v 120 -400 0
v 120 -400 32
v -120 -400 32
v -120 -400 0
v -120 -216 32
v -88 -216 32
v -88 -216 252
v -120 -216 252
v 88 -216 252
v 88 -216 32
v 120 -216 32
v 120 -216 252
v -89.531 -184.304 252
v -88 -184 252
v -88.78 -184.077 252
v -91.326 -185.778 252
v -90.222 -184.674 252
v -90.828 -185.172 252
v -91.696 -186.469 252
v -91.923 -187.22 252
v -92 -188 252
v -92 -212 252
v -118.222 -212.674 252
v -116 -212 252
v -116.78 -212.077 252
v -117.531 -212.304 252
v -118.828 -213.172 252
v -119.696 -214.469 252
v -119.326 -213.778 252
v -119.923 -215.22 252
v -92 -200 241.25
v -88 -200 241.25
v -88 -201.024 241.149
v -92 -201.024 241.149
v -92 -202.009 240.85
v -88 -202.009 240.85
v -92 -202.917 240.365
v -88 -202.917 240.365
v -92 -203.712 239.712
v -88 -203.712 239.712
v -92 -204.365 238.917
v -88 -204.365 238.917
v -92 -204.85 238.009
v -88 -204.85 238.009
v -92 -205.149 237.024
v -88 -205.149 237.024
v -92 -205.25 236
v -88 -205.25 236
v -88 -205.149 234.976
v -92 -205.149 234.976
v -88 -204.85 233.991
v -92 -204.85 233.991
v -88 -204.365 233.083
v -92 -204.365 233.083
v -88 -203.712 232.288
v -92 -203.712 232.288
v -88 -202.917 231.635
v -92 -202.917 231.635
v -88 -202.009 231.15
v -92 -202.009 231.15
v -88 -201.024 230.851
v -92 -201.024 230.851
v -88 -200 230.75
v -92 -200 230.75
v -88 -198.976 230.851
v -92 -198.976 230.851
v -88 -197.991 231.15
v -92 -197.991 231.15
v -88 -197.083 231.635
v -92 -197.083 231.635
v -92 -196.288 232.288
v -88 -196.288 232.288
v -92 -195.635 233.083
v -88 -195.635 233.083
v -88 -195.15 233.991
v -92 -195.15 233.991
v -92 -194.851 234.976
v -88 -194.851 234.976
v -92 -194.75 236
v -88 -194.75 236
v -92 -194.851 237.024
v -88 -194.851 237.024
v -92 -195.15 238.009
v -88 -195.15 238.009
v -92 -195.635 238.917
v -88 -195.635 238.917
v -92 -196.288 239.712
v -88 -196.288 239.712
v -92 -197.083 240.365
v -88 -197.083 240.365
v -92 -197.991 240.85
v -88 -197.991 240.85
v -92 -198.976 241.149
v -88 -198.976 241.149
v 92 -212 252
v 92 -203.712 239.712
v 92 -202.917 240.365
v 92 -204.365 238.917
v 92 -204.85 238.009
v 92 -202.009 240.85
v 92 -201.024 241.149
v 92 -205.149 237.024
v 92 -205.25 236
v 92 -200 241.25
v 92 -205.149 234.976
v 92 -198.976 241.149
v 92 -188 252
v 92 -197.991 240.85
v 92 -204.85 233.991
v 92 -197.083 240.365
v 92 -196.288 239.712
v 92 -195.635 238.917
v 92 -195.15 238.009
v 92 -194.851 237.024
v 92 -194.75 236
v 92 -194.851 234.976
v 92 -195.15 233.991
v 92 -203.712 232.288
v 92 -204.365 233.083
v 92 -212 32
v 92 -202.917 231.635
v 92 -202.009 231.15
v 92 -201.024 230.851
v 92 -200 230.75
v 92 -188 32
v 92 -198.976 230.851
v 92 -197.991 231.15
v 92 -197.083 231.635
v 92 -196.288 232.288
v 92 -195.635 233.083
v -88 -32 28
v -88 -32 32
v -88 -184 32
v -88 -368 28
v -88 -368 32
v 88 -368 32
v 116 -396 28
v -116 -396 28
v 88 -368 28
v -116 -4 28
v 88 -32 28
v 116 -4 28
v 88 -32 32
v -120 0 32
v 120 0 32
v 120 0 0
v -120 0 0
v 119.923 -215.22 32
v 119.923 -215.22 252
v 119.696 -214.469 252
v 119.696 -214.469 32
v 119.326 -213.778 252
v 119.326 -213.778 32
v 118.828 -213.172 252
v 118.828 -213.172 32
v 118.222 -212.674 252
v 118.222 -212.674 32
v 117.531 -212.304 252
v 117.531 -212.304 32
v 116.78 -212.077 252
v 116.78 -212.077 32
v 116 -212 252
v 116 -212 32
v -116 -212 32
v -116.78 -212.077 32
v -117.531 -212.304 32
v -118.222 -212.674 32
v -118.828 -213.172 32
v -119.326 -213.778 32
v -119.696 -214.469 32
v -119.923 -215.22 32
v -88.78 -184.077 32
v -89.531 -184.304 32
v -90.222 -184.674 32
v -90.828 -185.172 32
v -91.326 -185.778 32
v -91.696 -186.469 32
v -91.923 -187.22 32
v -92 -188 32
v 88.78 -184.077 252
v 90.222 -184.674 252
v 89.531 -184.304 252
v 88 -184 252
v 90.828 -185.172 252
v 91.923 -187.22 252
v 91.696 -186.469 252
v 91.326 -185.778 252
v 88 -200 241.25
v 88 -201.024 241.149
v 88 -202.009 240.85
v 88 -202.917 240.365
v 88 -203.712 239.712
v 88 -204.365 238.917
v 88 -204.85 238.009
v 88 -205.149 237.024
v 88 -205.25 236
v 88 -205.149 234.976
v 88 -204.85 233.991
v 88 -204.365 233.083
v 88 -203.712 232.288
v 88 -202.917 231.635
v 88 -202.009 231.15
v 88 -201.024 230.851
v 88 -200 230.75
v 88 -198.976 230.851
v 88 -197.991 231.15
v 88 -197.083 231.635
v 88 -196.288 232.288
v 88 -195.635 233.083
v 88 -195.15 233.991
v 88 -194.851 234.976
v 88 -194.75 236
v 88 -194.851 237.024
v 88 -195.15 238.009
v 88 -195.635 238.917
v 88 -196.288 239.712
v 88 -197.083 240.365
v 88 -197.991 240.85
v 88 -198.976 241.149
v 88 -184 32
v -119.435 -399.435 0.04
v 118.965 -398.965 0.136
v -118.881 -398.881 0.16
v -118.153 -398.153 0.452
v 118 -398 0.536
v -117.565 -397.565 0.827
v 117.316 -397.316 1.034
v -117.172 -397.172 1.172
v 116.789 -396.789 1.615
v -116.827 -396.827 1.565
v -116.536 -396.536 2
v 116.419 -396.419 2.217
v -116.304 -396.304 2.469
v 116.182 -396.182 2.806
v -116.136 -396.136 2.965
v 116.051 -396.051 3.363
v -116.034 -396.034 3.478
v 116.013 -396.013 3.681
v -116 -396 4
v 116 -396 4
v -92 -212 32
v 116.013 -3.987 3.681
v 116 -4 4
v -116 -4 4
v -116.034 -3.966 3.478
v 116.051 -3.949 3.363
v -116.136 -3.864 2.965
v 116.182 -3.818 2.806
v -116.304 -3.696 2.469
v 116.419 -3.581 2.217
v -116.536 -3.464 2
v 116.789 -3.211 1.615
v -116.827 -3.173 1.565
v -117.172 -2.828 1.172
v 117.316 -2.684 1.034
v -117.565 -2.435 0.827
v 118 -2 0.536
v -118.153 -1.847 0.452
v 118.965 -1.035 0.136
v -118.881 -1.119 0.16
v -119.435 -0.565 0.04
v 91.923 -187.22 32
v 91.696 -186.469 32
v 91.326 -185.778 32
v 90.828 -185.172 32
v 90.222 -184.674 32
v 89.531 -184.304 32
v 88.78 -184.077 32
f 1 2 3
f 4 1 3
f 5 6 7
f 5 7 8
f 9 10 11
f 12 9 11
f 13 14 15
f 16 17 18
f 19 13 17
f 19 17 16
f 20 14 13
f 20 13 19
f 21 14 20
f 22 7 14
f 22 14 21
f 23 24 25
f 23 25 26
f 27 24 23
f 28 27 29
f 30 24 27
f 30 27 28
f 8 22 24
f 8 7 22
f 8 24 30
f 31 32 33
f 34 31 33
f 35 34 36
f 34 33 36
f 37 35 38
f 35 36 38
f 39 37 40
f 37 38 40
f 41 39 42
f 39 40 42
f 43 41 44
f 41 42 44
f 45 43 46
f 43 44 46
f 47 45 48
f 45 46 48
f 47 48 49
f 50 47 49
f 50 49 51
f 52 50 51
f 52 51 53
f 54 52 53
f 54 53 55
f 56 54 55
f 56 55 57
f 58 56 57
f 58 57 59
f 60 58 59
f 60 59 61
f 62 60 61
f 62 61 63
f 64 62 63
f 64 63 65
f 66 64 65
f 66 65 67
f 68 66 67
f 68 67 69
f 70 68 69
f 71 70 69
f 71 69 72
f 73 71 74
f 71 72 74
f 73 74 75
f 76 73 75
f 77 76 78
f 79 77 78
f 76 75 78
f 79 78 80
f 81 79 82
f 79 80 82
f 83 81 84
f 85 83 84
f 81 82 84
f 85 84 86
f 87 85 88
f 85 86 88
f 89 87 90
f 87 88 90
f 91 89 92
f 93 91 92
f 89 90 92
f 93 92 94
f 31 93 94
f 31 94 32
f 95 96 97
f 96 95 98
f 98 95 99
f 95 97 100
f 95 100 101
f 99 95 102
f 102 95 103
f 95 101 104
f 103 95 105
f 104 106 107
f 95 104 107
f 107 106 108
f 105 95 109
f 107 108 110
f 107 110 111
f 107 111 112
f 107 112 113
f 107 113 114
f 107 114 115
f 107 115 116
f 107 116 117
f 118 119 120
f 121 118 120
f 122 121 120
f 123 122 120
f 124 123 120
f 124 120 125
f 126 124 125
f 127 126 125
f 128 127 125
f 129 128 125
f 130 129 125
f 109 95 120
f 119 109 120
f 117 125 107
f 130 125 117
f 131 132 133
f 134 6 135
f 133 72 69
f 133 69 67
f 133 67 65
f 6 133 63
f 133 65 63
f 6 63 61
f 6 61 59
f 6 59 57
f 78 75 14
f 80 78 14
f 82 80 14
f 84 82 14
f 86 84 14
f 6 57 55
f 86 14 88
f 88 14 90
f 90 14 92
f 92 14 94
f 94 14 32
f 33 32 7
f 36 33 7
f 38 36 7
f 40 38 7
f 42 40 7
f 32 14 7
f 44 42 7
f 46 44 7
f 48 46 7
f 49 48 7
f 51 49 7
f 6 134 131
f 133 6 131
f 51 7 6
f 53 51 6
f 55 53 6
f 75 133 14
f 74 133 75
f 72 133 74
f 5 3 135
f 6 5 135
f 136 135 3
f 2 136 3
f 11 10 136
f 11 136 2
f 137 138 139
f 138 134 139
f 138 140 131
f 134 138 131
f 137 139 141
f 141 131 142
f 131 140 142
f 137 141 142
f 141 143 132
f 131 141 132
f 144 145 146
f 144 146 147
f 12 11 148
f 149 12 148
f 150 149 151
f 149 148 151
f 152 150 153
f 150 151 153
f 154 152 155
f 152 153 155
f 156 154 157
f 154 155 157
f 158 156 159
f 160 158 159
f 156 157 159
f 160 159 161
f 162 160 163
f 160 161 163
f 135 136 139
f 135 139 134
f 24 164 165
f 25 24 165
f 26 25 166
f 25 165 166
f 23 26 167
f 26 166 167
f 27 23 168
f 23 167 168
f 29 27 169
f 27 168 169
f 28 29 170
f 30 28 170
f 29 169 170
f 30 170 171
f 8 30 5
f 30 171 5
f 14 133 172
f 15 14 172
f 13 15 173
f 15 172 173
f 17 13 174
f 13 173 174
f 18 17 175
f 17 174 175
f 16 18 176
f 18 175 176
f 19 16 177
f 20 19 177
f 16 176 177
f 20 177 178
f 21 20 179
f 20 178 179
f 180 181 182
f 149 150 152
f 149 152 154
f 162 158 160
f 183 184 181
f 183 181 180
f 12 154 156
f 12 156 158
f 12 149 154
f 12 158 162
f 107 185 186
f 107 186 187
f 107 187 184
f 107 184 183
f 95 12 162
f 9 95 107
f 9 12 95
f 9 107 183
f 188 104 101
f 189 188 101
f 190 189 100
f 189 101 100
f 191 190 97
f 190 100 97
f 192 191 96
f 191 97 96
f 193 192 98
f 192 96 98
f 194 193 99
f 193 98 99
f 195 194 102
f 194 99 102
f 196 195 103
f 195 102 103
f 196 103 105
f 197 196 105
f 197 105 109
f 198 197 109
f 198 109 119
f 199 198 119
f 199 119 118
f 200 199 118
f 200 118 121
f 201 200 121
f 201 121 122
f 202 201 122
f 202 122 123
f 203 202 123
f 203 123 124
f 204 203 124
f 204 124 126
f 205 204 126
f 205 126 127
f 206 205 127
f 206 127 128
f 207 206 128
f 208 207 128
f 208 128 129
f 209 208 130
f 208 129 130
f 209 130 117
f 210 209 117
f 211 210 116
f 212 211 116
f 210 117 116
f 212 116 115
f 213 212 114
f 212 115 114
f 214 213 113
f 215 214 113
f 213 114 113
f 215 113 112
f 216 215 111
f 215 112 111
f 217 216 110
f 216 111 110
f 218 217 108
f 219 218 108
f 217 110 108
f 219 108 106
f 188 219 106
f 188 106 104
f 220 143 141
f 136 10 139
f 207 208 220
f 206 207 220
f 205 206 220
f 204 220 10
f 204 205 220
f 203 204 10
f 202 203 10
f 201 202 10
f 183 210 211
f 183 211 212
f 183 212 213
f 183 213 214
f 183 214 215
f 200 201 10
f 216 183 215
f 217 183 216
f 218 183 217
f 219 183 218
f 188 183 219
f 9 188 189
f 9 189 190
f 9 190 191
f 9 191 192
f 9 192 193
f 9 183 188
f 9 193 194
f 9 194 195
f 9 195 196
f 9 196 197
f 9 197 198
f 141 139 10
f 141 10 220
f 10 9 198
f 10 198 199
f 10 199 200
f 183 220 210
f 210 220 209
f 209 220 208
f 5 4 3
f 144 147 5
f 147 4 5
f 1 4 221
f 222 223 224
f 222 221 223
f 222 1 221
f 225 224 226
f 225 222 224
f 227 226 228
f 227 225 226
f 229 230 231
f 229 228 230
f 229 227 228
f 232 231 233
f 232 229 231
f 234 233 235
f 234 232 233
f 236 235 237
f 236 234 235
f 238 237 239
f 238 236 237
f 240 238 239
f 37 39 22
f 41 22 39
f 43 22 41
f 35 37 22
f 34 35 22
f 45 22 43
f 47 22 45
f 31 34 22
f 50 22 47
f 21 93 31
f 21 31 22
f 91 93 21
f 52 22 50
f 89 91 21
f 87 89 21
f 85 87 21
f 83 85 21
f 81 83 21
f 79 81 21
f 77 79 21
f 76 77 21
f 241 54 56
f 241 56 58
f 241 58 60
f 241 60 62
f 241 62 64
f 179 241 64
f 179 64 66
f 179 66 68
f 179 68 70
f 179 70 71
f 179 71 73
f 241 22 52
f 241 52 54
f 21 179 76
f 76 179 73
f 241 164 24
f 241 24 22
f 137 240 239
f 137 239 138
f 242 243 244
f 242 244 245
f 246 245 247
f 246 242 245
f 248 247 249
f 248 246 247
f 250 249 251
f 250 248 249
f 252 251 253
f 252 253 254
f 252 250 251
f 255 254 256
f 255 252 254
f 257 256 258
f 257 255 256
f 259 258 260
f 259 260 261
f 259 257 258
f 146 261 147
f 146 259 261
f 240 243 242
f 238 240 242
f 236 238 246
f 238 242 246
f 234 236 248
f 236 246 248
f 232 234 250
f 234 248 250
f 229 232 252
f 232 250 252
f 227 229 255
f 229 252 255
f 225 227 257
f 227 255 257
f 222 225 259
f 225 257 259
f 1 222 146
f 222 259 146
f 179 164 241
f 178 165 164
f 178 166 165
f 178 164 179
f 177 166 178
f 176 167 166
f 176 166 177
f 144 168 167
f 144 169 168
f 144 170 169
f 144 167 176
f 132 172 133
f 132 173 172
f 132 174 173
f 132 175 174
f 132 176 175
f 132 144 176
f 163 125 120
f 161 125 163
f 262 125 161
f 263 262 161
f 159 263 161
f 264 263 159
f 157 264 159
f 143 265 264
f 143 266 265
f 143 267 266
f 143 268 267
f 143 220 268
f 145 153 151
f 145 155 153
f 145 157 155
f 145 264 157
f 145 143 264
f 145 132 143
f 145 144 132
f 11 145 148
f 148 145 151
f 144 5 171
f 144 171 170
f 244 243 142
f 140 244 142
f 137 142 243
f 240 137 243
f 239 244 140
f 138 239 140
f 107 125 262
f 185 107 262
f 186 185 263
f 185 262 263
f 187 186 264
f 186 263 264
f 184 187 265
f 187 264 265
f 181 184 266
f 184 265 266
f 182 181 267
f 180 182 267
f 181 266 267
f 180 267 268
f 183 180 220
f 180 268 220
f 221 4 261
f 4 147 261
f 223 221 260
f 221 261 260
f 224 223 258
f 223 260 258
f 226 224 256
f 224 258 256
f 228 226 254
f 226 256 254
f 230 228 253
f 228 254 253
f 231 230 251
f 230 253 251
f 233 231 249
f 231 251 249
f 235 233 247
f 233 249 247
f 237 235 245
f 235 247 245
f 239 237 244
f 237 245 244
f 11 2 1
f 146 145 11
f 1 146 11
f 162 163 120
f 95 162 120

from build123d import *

# Parameters (mm, degrees)
PAD_DEPTH       = 400
PAD001_DEPTH    = 240
SKETCH002_W     = 176
SKETCH002_H     = 336
POCKET_DEPTH    = 32.001
PAD002_DEPTH    = 220
SKETCH004_R     = 5.25
POCKET001_DEPTH = 212.001


with BuildPart() as part:
    # Sketch → Pad (new body)
    with BuildSketch(Plane.XZ):
        with BuildLine():
            Line((-120, 0), (-120, 32))
            Line((-120, 32), (120, 32))
            Line((120, 32), (120, 0))
            ThreePointArc((116, 4), (117.171573, 1.171573), (120, 0))
            Line((116, 28), (116, 4))
            Line((-116, 28), (116, 28))
            Line((-116, 4), (-116, 28))
            ThreePointArc((-120, 0), (-117.171573, 1.171573), (-116, 4))
        make_face()
    extrude(amount=PAD_DEPTH)

    # Sketch001 (on Face4 of Pad) → Pad001 (join)
    with BuildSketch(Plane(origin=(120, 0, 0), x_dir=(0, 0, 1), z_dir=(1, 0, 0))):
        with BuildLine():
            Line((32, 400), (0, 400))
            ThreePointArc((0, 400), (1.171573, 397.171573), (4, 396))
            Line((4, 396), (32, 396))
            Line((32, 396), (32, 400))
        make_face()
        with BuildLine():
            Line((0, 0), (32, 0))
            Line((32, 0), (32, 4))
            Line((4, 4), (32, 4))
            ThreePointArc((4, 4), (1.171573, 2.828427), (0, 0))
        make_face()
    extrude(amount=-PAD001_DEPTH)

    # Sketch002 (on Face13 of Pad001) → Pocket (cut, through all)
    with BuildSketch(Plane(origin=(0, 0, 32), x_dir=(-1, 0, 0), z_dir=(0, 0, 1))):
        with Locations((0, 200)):
            Rectangle(SKETCH002_W, SKETCH002_H)
    extrude(amount=-POCKET_DEPTH, mode=Mode.SUBTRACT)

    # Sketch003 (on Face13 of Pocket) → Pad002 (join)
    with BuildSketch(Plane(origin=(0, 0, 32), x_dir=(-1, 0, 0), z_dir=(0, 0, 1))):
        with BuildLine():
            Line((88, 216), (88, 184))
            ThreePointArc((88, 184), (90.828427, 185.171573), (92, 188))
            Line((92, 212), (92, 188))
            Line((116, 212), (92, 212))
            ThreePointArc((116, 212), (118.828427, 213.171573), (120, 216))
            Line((88, 216), (120, 216))
        make_face()
        with BuildLine():
            Line((-88, 216), (-120, 216))
            ThreePointArc((-120, 216), (-118.828427, 213.171573), (-116, 212))
            Line((-116, 212), (-92, 212))
            Line((-92, 212), (-92, 188))
            ThreePointArc((-92, 188), (-90.828427, 185.171573), (-88, 184))
            Line((-88, 216), (-88, 184))
        make_face()
    extrude(amount=PAD002_DEPTH)

    # Sketch004 (on Face27 of Pad002) → Pocket001 (cut, through all)
    with BuildSketch(Plane(origin=(92, 0, 0), x_dir=(0, 0, 1), z_dir=(1, 0, 0))):
        with Locations((236, 200)):
            Circle(SKETCH004_R)
    extrude(amount=-POCKET001_DEPTH, mode=Mode.SUBTRACT)


solid = part.part
